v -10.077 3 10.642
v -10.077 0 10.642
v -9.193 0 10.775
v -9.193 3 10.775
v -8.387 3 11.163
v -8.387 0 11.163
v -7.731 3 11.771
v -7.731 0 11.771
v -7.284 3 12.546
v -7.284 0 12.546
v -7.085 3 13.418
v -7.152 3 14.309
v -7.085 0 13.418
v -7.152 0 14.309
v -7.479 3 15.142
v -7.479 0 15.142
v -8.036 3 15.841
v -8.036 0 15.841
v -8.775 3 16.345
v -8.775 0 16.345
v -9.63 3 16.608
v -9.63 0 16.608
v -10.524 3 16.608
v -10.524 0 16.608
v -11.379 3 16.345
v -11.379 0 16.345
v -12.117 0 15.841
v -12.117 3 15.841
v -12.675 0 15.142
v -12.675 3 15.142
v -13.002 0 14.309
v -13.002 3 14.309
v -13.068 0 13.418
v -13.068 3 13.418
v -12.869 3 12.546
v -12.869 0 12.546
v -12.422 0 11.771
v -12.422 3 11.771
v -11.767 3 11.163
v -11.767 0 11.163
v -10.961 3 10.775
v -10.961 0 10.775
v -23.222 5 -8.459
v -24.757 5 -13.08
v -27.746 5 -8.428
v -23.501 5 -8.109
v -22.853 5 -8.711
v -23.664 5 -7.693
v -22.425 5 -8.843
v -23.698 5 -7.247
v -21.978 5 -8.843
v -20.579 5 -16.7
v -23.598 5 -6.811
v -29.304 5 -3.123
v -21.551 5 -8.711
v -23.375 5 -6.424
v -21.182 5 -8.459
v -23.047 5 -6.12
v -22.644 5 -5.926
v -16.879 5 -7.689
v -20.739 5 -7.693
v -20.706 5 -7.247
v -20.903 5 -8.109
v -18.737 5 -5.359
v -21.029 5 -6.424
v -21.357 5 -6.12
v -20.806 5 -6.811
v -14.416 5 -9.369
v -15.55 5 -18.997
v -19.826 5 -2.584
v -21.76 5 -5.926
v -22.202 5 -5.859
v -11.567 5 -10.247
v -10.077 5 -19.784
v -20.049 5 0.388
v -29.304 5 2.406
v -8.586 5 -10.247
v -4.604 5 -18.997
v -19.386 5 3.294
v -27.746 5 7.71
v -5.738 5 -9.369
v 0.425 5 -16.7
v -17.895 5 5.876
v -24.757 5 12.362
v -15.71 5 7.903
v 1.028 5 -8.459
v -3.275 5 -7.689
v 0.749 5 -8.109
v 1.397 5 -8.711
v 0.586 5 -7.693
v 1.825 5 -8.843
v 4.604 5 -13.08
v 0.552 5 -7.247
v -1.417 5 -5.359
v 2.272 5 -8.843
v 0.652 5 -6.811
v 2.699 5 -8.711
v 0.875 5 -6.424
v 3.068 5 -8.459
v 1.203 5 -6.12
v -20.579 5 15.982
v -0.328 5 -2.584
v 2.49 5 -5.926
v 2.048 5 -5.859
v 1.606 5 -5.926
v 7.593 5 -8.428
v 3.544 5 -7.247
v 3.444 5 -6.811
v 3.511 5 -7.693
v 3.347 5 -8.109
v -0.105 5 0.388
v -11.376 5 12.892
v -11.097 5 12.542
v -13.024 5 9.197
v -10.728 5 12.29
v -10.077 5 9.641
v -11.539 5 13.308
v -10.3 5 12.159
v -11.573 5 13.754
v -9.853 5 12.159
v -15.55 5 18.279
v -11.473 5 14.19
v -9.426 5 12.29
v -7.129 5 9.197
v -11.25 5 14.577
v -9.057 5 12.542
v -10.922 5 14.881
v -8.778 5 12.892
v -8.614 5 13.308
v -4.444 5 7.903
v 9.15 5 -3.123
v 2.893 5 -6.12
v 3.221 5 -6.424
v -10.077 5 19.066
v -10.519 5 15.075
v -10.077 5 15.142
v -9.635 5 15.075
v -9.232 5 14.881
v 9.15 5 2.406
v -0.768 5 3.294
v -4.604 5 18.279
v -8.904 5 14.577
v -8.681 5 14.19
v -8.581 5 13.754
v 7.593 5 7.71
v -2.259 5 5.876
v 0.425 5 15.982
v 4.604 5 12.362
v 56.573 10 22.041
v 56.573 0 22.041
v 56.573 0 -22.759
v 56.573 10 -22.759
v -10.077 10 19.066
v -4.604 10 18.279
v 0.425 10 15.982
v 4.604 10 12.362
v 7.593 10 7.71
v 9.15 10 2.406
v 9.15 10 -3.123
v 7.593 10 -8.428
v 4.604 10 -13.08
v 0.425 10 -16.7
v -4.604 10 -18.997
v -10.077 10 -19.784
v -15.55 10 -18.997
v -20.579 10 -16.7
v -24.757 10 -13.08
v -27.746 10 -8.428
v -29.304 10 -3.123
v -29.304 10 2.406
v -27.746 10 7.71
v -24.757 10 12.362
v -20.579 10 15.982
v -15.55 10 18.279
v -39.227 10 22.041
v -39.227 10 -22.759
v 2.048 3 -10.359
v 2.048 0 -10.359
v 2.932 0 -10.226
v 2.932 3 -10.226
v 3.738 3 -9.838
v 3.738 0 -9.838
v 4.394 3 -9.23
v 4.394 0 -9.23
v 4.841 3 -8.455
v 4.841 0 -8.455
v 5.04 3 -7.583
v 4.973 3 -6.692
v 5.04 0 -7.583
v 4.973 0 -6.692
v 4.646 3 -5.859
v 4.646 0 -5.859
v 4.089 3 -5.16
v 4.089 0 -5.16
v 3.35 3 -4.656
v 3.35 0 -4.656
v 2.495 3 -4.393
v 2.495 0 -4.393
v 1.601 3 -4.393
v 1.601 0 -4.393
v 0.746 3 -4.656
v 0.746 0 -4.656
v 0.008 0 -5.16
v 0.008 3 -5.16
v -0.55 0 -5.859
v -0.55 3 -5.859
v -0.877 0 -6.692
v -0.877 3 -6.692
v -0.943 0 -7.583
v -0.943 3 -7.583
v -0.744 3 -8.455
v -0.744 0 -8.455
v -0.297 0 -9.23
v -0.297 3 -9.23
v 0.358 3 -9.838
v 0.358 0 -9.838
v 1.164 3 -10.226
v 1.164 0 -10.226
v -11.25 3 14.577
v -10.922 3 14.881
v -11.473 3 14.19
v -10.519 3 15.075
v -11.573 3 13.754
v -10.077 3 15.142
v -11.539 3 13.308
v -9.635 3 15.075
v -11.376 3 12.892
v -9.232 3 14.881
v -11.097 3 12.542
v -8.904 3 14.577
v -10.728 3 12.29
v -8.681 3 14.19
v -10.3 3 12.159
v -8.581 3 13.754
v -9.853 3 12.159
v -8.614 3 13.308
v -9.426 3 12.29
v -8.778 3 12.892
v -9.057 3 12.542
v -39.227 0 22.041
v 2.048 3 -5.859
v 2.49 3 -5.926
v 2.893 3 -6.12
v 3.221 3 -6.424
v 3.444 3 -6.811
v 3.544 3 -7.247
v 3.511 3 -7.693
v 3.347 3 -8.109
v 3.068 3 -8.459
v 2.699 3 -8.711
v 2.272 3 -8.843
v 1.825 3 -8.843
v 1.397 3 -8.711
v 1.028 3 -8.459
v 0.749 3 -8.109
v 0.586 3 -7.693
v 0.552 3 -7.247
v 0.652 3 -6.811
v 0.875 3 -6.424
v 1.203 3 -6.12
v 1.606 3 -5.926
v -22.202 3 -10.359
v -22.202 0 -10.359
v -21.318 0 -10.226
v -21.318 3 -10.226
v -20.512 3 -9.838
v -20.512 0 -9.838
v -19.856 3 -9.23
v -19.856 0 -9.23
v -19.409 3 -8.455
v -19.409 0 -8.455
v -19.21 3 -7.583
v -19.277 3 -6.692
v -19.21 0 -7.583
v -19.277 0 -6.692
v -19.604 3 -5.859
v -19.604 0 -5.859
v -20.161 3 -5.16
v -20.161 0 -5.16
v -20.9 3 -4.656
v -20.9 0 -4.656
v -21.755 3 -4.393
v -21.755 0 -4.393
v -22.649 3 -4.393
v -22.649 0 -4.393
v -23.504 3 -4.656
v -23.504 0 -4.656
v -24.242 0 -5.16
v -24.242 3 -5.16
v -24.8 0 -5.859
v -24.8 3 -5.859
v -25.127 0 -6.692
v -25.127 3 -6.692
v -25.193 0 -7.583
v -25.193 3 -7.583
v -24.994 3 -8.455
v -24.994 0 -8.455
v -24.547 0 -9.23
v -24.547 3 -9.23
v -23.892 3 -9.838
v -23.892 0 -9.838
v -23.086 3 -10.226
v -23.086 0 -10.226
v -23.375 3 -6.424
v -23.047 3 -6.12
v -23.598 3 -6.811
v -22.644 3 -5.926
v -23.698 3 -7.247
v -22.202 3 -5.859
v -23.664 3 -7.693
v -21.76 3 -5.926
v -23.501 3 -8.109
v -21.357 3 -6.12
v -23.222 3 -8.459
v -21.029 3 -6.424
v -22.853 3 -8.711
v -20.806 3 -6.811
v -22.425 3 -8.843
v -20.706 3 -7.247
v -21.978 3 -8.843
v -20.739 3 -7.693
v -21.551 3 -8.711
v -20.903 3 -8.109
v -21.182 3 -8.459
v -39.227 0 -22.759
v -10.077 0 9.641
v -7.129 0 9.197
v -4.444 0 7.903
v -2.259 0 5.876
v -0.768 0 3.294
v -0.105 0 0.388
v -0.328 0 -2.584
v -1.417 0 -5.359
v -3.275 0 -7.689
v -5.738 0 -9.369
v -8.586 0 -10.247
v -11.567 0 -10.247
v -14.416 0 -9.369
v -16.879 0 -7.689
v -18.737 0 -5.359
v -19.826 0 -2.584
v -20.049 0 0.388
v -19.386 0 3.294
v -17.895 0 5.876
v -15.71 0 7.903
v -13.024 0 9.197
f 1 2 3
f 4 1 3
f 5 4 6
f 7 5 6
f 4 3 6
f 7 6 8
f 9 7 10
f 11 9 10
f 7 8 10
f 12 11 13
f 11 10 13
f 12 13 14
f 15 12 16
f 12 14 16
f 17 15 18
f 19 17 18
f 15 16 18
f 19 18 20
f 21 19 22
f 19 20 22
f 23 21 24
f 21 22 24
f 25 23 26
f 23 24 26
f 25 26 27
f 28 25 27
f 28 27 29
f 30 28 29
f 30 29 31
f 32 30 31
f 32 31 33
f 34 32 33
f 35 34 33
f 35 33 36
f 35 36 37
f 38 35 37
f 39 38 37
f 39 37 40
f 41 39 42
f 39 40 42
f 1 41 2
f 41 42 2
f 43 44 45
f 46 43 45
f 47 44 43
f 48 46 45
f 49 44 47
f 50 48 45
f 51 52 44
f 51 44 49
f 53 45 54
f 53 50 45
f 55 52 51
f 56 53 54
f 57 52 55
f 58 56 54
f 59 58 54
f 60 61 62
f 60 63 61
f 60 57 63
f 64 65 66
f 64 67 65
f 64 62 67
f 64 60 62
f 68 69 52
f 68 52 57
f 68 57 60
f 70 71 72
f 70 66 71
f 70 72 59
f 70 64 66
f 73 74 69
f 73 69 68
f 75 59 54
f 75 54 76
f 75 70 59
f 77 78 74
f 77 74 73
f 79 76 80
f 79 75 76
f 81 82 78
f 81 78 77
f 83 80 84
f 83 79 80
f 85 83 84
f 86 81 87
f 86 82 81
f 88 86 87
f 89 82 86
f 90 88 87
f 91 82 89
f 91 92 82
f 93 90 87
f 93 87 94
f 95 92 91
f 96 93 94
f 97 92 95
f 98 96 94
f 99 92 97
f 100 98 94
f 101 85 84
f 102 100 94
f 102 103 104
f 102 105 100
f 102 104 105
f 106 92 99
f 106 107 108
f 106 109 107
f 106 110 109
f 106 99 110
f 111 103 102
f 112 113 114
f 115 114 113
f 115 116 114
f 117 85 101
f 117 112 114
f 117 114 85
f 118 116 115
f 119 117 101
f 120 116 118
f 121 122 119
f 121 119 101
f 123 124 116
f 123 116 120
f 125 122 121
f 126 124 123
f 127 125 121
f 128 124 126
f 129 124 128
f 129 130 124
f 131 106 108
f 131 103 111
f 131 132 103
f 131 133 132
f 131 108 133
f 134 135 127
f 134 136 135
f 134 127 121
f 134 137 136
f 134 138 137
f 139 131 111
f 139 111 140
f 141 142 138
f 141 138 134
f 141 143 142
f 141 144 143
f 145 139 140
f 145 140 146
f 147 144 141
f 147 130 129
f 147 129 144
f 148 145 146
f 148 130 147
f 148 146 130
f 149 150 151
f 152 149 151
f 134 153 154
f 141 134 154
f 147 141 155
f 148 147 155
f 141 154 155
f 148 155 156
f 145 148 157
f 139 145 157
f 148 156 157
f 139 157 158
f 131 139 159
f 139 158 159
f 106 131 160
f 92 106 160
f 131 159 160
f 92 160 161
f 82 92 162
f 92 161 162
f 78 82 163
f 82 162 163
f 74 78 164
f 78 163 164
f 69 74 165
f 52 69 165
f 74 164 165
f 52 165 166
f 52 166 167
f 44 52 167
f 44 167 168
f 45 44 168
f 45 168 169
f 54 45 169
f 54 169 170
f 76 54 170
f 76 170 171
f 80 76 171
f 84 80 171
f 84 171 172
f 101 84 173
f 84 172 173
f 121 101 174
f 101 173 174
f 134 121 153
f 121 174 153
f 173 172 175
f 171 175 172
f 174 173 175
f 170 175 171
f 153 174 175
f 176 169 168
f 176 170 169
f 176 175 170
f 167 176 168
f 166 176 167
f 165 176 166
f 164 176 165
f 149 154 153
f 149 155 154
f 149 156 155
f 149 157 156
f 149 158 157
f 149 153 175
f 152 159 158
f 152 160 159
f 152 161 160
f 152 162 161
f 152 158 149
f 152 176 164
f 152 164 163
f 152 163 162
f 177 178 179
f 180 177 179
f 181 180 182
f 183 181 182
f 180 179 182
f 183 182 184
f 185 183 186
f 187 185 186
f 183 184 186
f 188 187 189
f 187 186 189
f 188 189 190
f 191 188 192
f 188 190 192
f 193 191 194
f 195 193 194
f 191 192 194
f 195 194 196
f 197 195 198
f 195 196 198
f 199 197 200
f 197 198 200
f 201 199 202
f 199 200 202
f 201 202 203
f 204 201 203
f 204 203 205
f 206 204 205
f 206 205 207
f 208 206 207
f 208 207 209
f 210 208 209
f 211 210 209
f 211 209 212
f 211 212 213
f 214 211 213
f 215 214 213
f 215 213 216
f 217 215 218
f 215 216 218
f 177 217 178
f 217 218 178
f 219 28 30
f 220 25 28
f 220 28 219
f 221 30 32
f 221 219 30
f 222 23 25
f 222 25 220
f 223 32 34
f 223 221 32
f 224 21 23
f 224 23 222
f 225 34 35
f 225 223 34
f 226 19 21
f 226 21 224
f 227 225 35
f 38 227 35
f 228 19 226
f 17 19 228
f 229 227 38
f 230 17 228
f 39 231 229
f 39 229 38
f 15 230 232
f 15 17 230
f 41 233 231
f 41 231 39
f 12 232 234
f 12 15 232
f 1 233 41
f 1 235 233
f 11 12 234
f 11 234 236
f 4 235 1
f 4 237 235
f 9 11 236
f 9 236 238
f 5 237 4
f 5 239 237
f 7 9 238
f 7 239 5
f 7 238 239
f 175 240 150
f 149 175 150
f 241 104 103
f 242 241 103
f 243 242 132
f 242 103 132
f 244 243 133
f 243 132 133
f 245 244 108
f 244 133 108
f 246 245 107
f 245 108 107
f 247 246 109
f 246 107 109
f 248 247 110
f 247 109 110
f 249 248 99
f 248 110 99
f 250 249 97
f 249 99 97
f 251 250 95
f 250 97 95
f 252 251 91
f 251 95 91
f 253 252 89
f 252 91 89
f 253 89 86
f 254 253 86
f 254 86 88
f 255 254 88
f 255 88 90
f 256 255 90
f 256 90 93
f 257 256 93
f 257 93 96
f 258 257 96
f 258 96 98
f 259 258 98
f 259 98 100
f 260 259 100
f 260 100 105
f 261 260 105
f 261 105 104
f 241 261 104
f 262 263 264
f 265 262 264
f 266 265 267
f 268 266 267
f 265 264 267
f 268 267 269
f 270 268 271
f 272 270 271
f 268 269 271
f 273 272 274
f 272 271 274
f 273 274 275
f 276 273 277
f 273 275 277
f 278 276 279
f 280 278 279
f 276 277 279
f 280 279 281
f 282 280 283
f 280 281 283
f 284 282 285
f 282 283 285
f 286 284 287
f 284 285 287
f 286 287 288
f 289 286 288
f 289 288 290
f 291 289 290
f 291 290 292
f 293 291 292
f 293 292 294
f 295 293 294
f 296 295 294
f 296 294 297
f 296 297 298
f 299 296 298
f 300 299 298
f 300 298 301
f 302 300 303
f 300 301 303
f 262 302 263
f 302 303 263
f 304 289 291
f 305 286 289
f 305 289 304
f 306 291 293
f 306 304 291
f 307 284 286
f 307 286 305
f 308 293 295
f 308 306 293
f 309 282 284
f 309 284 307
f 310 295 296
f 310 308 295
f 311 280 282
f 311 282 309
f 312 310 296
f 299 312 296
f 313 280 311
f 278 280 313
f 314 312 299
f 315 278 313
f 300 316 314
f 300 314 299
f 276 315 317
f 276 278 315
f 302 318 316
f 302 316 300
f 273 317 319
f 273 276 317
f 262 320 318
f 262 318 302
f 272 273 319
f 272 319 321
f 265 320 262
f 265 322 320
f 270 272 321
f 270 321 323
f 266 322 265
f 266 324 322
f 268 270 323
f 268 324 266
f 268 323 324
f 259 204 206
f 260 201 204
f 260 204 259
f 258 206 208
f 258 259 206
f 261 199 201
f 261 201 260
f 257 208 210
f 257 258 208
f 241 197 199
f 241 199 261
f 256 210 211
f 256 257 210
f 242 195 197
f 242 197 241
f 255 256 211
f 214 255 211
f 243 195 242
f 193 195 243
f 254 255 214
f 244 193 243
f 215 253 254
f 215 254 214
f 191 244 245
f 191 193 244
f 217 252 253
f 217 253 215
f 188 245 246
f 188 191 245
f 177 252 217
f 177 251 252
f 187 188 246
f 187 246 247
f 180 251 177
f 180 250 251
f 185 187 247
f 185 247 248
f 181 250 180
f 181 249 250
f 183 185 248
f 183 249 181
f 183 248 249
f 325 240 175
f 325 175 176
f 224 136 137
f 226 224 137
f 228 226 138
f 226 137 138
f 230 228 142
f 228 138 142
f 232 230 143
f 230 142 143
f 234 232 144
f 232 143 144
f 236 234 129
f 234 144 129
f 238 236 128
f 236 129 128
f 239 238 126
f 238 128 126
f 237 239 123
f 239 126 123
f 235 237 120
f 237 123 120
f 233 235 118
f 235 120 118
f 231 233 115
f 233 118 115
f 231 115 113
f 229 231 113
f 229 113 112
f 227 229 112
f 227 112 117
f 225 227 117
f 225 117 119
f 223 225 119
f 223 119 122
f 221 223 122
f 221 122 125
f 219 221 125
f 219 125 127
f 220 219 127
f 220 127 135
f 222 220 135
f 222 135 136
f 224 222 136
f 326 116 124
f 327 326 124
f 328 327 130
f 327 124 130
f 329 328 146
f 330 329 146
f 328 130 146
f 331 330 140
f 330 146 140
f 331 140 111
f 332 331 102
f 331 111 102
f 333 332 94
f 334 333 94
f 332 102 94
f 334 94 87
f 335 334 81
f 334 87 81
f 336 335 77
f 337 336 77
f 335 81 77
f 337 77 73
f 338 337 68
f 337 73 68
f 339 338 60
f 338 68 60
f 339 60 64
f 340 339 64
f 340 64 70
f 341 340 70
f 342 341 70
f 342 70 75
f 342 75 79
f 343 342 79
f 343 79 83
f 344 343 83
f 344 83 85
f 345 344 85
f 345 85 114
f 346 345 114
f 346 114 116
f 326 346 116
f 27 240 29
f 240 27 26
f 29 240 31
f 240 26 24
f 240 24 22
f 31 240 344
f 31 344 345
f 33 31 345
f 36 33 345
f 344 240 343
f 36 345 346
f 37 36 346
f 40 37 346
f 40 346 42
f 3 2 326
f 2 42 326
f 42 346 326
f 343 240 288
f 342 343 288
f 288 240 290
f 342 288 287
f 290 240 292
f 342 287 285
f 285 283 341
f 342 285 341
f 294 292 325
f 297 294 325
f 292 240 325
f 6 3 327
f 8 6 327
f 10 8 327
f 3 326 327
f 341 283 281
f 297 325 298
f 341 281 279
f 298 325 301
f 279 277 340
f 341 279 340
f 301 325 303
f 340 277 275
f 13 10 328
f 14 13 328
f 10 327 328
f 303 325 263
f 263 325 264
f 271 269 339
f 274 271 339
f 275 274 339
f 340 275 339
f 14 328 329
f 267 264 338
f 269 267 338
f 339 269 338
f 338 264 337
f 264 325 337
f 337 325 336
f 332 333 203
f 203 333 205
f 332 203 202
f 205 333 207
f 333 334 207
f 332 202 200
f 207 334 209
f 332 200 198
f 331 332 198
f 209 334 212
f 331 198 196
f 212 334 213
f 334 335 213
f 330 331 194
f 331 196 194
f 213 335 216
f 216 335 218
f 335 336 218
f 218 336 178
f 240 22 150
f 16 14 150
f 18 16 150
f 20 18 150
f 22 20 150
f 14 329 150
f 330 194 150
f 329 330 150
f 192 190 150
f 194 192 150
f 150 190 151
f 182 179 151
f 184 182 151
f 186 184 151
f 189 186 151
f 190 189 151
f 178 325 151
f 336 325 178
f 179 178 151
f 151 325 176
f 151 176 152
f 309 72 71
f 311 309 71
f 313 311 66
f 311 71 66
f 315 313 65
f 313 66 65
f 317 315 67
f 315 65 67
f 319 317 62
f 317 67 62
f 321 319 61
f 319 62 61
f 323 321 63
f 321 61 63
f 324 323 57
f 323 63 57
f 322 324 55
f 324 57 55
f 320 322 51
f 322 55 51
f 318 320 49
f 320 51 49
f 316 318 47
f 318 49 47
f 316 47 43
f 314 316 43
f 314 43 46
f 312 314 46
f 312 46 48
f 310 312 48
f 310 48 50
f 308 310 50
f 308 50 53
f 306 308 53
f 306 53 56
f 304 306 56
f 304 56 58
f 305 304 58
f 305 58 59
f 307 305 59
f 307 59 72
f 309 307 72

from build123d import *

# Parameters (mm, degrees)
ENCODERSIDEWALLSKETCH_W    = 95.8
ENCODERSIDEWALLSKETCH_H    = 44.8
BOSS_EXTRUDE1_DEPTH        = 10
SKETCH2_R                  = 10
ENCODERAXLECUT_DEPTH       = 10
ENCODERFULLHOLE_R          = 19.425
ENCODERFULLHOLEBORE_DEPTH  = 5
ENCODERSCREWLAYOUTSKETCH_R = 1.5
ENCODERSCREWLAYOUT_DEPTH   = 62.184071257
SKETCH6_R                  = 3
CUT_EXTRUDE4_DEPTH         = 3


with BuildPart() as part:
    # EncoderSideWallSketch → Boss-Extrude1 (new body)
    with BuildSketch(Plane(origin=(0, 0, 0), x_dir=(1, 0, 0), z_dir=(0, 1, 0))):
        with Locations((8.673150268, 0.358937681)):
            Rectangle(ENCODERSIDEWALLSKETCH_W, ENCODERSIDEWALLSKETCH_H)
    extrude(amount=BOSS_EXTRUDE1_DEPTH)

    # Sketch2 → EncoderAxleCut (cut)
    with BuildSketch(Plane(origin=(0, 10, 0), x_dir=(1, 0, 0), z_dir=(0, 1, 0))):
        with Locations(Location((-10.076849732, 0.358937681, 0), (0, 0, 270))):
            Circle(SKETCH2_R)
    extrude(amount=-ENCODERAXLECUT_DEPTH, mode=Mode.SUBTRACT)

    # EncoderFullHole → EncoderFullHoleBore (cut)
    with BuildSketch(Plane(origin=(0, 10, 0), x_dir=(1, 0, 0), z_dir=(0, 1, 0))):
        with Locations(Location((-10.076849732, 0.358937681, 0), (0, 0, 270))):
            Circle(ENCODERFULLHOLE_R)
    extrude(amount=-ENCODERFULLHOLEBORE_DEPTH, mode=Mode.SUBTRACT)

    # EncoderScrewLayoutSketch → EncoderScrewLayout (cut, through all)
    with BuildSketch(Plane(origin=(0, 5, 0), x_dir=(1, 0, 0), z_dir=(0, 1, 0))):
        with Locations(Location((-22.201849732, 7.359309695, 0), (0, 0, 270))):
            Circle(ENCODERSCREWLAYOUTSKETCH_R)
        with Locations(Location((2.048150268, 7.359309695, 0), (0, 0, 270))):
            Circle(ENCODERSCREWLAYOUTSKETCH_R)
        with Locations(Location((-10.076849732, -13.641806347, 0), (0, 0, 270))):
            Circle(ENCODERSCREWLAYOUTSKETCH_R)
    extrude(amount=-ENCODERSCREWLAYOUT_DEPTH, mode=Mode.SUBTRACT)

    # Sketch6 → Cut-Extrude4 (cut)
    with BuildSketch(Plane.XZ):
        with Locations(Location((-10.076849732, 13.641806347, 0), (0, 0, 270))):
            Circle(SKETCH6_R)
        with Locations(Location((-22.201849732, -7.359309695, 0), (0, 0, 270))):
            Circle(SKETCH6_R)
        with Locations(Location((2.048150268, -7.359309695, 0), (0, 0, 270))):
            Circle(SKETCH6_R)
    extrude(amount=-CUT_EXTRUDE4_DEPTH, mode=Mode.SUBTRACT)


solid = part.part
